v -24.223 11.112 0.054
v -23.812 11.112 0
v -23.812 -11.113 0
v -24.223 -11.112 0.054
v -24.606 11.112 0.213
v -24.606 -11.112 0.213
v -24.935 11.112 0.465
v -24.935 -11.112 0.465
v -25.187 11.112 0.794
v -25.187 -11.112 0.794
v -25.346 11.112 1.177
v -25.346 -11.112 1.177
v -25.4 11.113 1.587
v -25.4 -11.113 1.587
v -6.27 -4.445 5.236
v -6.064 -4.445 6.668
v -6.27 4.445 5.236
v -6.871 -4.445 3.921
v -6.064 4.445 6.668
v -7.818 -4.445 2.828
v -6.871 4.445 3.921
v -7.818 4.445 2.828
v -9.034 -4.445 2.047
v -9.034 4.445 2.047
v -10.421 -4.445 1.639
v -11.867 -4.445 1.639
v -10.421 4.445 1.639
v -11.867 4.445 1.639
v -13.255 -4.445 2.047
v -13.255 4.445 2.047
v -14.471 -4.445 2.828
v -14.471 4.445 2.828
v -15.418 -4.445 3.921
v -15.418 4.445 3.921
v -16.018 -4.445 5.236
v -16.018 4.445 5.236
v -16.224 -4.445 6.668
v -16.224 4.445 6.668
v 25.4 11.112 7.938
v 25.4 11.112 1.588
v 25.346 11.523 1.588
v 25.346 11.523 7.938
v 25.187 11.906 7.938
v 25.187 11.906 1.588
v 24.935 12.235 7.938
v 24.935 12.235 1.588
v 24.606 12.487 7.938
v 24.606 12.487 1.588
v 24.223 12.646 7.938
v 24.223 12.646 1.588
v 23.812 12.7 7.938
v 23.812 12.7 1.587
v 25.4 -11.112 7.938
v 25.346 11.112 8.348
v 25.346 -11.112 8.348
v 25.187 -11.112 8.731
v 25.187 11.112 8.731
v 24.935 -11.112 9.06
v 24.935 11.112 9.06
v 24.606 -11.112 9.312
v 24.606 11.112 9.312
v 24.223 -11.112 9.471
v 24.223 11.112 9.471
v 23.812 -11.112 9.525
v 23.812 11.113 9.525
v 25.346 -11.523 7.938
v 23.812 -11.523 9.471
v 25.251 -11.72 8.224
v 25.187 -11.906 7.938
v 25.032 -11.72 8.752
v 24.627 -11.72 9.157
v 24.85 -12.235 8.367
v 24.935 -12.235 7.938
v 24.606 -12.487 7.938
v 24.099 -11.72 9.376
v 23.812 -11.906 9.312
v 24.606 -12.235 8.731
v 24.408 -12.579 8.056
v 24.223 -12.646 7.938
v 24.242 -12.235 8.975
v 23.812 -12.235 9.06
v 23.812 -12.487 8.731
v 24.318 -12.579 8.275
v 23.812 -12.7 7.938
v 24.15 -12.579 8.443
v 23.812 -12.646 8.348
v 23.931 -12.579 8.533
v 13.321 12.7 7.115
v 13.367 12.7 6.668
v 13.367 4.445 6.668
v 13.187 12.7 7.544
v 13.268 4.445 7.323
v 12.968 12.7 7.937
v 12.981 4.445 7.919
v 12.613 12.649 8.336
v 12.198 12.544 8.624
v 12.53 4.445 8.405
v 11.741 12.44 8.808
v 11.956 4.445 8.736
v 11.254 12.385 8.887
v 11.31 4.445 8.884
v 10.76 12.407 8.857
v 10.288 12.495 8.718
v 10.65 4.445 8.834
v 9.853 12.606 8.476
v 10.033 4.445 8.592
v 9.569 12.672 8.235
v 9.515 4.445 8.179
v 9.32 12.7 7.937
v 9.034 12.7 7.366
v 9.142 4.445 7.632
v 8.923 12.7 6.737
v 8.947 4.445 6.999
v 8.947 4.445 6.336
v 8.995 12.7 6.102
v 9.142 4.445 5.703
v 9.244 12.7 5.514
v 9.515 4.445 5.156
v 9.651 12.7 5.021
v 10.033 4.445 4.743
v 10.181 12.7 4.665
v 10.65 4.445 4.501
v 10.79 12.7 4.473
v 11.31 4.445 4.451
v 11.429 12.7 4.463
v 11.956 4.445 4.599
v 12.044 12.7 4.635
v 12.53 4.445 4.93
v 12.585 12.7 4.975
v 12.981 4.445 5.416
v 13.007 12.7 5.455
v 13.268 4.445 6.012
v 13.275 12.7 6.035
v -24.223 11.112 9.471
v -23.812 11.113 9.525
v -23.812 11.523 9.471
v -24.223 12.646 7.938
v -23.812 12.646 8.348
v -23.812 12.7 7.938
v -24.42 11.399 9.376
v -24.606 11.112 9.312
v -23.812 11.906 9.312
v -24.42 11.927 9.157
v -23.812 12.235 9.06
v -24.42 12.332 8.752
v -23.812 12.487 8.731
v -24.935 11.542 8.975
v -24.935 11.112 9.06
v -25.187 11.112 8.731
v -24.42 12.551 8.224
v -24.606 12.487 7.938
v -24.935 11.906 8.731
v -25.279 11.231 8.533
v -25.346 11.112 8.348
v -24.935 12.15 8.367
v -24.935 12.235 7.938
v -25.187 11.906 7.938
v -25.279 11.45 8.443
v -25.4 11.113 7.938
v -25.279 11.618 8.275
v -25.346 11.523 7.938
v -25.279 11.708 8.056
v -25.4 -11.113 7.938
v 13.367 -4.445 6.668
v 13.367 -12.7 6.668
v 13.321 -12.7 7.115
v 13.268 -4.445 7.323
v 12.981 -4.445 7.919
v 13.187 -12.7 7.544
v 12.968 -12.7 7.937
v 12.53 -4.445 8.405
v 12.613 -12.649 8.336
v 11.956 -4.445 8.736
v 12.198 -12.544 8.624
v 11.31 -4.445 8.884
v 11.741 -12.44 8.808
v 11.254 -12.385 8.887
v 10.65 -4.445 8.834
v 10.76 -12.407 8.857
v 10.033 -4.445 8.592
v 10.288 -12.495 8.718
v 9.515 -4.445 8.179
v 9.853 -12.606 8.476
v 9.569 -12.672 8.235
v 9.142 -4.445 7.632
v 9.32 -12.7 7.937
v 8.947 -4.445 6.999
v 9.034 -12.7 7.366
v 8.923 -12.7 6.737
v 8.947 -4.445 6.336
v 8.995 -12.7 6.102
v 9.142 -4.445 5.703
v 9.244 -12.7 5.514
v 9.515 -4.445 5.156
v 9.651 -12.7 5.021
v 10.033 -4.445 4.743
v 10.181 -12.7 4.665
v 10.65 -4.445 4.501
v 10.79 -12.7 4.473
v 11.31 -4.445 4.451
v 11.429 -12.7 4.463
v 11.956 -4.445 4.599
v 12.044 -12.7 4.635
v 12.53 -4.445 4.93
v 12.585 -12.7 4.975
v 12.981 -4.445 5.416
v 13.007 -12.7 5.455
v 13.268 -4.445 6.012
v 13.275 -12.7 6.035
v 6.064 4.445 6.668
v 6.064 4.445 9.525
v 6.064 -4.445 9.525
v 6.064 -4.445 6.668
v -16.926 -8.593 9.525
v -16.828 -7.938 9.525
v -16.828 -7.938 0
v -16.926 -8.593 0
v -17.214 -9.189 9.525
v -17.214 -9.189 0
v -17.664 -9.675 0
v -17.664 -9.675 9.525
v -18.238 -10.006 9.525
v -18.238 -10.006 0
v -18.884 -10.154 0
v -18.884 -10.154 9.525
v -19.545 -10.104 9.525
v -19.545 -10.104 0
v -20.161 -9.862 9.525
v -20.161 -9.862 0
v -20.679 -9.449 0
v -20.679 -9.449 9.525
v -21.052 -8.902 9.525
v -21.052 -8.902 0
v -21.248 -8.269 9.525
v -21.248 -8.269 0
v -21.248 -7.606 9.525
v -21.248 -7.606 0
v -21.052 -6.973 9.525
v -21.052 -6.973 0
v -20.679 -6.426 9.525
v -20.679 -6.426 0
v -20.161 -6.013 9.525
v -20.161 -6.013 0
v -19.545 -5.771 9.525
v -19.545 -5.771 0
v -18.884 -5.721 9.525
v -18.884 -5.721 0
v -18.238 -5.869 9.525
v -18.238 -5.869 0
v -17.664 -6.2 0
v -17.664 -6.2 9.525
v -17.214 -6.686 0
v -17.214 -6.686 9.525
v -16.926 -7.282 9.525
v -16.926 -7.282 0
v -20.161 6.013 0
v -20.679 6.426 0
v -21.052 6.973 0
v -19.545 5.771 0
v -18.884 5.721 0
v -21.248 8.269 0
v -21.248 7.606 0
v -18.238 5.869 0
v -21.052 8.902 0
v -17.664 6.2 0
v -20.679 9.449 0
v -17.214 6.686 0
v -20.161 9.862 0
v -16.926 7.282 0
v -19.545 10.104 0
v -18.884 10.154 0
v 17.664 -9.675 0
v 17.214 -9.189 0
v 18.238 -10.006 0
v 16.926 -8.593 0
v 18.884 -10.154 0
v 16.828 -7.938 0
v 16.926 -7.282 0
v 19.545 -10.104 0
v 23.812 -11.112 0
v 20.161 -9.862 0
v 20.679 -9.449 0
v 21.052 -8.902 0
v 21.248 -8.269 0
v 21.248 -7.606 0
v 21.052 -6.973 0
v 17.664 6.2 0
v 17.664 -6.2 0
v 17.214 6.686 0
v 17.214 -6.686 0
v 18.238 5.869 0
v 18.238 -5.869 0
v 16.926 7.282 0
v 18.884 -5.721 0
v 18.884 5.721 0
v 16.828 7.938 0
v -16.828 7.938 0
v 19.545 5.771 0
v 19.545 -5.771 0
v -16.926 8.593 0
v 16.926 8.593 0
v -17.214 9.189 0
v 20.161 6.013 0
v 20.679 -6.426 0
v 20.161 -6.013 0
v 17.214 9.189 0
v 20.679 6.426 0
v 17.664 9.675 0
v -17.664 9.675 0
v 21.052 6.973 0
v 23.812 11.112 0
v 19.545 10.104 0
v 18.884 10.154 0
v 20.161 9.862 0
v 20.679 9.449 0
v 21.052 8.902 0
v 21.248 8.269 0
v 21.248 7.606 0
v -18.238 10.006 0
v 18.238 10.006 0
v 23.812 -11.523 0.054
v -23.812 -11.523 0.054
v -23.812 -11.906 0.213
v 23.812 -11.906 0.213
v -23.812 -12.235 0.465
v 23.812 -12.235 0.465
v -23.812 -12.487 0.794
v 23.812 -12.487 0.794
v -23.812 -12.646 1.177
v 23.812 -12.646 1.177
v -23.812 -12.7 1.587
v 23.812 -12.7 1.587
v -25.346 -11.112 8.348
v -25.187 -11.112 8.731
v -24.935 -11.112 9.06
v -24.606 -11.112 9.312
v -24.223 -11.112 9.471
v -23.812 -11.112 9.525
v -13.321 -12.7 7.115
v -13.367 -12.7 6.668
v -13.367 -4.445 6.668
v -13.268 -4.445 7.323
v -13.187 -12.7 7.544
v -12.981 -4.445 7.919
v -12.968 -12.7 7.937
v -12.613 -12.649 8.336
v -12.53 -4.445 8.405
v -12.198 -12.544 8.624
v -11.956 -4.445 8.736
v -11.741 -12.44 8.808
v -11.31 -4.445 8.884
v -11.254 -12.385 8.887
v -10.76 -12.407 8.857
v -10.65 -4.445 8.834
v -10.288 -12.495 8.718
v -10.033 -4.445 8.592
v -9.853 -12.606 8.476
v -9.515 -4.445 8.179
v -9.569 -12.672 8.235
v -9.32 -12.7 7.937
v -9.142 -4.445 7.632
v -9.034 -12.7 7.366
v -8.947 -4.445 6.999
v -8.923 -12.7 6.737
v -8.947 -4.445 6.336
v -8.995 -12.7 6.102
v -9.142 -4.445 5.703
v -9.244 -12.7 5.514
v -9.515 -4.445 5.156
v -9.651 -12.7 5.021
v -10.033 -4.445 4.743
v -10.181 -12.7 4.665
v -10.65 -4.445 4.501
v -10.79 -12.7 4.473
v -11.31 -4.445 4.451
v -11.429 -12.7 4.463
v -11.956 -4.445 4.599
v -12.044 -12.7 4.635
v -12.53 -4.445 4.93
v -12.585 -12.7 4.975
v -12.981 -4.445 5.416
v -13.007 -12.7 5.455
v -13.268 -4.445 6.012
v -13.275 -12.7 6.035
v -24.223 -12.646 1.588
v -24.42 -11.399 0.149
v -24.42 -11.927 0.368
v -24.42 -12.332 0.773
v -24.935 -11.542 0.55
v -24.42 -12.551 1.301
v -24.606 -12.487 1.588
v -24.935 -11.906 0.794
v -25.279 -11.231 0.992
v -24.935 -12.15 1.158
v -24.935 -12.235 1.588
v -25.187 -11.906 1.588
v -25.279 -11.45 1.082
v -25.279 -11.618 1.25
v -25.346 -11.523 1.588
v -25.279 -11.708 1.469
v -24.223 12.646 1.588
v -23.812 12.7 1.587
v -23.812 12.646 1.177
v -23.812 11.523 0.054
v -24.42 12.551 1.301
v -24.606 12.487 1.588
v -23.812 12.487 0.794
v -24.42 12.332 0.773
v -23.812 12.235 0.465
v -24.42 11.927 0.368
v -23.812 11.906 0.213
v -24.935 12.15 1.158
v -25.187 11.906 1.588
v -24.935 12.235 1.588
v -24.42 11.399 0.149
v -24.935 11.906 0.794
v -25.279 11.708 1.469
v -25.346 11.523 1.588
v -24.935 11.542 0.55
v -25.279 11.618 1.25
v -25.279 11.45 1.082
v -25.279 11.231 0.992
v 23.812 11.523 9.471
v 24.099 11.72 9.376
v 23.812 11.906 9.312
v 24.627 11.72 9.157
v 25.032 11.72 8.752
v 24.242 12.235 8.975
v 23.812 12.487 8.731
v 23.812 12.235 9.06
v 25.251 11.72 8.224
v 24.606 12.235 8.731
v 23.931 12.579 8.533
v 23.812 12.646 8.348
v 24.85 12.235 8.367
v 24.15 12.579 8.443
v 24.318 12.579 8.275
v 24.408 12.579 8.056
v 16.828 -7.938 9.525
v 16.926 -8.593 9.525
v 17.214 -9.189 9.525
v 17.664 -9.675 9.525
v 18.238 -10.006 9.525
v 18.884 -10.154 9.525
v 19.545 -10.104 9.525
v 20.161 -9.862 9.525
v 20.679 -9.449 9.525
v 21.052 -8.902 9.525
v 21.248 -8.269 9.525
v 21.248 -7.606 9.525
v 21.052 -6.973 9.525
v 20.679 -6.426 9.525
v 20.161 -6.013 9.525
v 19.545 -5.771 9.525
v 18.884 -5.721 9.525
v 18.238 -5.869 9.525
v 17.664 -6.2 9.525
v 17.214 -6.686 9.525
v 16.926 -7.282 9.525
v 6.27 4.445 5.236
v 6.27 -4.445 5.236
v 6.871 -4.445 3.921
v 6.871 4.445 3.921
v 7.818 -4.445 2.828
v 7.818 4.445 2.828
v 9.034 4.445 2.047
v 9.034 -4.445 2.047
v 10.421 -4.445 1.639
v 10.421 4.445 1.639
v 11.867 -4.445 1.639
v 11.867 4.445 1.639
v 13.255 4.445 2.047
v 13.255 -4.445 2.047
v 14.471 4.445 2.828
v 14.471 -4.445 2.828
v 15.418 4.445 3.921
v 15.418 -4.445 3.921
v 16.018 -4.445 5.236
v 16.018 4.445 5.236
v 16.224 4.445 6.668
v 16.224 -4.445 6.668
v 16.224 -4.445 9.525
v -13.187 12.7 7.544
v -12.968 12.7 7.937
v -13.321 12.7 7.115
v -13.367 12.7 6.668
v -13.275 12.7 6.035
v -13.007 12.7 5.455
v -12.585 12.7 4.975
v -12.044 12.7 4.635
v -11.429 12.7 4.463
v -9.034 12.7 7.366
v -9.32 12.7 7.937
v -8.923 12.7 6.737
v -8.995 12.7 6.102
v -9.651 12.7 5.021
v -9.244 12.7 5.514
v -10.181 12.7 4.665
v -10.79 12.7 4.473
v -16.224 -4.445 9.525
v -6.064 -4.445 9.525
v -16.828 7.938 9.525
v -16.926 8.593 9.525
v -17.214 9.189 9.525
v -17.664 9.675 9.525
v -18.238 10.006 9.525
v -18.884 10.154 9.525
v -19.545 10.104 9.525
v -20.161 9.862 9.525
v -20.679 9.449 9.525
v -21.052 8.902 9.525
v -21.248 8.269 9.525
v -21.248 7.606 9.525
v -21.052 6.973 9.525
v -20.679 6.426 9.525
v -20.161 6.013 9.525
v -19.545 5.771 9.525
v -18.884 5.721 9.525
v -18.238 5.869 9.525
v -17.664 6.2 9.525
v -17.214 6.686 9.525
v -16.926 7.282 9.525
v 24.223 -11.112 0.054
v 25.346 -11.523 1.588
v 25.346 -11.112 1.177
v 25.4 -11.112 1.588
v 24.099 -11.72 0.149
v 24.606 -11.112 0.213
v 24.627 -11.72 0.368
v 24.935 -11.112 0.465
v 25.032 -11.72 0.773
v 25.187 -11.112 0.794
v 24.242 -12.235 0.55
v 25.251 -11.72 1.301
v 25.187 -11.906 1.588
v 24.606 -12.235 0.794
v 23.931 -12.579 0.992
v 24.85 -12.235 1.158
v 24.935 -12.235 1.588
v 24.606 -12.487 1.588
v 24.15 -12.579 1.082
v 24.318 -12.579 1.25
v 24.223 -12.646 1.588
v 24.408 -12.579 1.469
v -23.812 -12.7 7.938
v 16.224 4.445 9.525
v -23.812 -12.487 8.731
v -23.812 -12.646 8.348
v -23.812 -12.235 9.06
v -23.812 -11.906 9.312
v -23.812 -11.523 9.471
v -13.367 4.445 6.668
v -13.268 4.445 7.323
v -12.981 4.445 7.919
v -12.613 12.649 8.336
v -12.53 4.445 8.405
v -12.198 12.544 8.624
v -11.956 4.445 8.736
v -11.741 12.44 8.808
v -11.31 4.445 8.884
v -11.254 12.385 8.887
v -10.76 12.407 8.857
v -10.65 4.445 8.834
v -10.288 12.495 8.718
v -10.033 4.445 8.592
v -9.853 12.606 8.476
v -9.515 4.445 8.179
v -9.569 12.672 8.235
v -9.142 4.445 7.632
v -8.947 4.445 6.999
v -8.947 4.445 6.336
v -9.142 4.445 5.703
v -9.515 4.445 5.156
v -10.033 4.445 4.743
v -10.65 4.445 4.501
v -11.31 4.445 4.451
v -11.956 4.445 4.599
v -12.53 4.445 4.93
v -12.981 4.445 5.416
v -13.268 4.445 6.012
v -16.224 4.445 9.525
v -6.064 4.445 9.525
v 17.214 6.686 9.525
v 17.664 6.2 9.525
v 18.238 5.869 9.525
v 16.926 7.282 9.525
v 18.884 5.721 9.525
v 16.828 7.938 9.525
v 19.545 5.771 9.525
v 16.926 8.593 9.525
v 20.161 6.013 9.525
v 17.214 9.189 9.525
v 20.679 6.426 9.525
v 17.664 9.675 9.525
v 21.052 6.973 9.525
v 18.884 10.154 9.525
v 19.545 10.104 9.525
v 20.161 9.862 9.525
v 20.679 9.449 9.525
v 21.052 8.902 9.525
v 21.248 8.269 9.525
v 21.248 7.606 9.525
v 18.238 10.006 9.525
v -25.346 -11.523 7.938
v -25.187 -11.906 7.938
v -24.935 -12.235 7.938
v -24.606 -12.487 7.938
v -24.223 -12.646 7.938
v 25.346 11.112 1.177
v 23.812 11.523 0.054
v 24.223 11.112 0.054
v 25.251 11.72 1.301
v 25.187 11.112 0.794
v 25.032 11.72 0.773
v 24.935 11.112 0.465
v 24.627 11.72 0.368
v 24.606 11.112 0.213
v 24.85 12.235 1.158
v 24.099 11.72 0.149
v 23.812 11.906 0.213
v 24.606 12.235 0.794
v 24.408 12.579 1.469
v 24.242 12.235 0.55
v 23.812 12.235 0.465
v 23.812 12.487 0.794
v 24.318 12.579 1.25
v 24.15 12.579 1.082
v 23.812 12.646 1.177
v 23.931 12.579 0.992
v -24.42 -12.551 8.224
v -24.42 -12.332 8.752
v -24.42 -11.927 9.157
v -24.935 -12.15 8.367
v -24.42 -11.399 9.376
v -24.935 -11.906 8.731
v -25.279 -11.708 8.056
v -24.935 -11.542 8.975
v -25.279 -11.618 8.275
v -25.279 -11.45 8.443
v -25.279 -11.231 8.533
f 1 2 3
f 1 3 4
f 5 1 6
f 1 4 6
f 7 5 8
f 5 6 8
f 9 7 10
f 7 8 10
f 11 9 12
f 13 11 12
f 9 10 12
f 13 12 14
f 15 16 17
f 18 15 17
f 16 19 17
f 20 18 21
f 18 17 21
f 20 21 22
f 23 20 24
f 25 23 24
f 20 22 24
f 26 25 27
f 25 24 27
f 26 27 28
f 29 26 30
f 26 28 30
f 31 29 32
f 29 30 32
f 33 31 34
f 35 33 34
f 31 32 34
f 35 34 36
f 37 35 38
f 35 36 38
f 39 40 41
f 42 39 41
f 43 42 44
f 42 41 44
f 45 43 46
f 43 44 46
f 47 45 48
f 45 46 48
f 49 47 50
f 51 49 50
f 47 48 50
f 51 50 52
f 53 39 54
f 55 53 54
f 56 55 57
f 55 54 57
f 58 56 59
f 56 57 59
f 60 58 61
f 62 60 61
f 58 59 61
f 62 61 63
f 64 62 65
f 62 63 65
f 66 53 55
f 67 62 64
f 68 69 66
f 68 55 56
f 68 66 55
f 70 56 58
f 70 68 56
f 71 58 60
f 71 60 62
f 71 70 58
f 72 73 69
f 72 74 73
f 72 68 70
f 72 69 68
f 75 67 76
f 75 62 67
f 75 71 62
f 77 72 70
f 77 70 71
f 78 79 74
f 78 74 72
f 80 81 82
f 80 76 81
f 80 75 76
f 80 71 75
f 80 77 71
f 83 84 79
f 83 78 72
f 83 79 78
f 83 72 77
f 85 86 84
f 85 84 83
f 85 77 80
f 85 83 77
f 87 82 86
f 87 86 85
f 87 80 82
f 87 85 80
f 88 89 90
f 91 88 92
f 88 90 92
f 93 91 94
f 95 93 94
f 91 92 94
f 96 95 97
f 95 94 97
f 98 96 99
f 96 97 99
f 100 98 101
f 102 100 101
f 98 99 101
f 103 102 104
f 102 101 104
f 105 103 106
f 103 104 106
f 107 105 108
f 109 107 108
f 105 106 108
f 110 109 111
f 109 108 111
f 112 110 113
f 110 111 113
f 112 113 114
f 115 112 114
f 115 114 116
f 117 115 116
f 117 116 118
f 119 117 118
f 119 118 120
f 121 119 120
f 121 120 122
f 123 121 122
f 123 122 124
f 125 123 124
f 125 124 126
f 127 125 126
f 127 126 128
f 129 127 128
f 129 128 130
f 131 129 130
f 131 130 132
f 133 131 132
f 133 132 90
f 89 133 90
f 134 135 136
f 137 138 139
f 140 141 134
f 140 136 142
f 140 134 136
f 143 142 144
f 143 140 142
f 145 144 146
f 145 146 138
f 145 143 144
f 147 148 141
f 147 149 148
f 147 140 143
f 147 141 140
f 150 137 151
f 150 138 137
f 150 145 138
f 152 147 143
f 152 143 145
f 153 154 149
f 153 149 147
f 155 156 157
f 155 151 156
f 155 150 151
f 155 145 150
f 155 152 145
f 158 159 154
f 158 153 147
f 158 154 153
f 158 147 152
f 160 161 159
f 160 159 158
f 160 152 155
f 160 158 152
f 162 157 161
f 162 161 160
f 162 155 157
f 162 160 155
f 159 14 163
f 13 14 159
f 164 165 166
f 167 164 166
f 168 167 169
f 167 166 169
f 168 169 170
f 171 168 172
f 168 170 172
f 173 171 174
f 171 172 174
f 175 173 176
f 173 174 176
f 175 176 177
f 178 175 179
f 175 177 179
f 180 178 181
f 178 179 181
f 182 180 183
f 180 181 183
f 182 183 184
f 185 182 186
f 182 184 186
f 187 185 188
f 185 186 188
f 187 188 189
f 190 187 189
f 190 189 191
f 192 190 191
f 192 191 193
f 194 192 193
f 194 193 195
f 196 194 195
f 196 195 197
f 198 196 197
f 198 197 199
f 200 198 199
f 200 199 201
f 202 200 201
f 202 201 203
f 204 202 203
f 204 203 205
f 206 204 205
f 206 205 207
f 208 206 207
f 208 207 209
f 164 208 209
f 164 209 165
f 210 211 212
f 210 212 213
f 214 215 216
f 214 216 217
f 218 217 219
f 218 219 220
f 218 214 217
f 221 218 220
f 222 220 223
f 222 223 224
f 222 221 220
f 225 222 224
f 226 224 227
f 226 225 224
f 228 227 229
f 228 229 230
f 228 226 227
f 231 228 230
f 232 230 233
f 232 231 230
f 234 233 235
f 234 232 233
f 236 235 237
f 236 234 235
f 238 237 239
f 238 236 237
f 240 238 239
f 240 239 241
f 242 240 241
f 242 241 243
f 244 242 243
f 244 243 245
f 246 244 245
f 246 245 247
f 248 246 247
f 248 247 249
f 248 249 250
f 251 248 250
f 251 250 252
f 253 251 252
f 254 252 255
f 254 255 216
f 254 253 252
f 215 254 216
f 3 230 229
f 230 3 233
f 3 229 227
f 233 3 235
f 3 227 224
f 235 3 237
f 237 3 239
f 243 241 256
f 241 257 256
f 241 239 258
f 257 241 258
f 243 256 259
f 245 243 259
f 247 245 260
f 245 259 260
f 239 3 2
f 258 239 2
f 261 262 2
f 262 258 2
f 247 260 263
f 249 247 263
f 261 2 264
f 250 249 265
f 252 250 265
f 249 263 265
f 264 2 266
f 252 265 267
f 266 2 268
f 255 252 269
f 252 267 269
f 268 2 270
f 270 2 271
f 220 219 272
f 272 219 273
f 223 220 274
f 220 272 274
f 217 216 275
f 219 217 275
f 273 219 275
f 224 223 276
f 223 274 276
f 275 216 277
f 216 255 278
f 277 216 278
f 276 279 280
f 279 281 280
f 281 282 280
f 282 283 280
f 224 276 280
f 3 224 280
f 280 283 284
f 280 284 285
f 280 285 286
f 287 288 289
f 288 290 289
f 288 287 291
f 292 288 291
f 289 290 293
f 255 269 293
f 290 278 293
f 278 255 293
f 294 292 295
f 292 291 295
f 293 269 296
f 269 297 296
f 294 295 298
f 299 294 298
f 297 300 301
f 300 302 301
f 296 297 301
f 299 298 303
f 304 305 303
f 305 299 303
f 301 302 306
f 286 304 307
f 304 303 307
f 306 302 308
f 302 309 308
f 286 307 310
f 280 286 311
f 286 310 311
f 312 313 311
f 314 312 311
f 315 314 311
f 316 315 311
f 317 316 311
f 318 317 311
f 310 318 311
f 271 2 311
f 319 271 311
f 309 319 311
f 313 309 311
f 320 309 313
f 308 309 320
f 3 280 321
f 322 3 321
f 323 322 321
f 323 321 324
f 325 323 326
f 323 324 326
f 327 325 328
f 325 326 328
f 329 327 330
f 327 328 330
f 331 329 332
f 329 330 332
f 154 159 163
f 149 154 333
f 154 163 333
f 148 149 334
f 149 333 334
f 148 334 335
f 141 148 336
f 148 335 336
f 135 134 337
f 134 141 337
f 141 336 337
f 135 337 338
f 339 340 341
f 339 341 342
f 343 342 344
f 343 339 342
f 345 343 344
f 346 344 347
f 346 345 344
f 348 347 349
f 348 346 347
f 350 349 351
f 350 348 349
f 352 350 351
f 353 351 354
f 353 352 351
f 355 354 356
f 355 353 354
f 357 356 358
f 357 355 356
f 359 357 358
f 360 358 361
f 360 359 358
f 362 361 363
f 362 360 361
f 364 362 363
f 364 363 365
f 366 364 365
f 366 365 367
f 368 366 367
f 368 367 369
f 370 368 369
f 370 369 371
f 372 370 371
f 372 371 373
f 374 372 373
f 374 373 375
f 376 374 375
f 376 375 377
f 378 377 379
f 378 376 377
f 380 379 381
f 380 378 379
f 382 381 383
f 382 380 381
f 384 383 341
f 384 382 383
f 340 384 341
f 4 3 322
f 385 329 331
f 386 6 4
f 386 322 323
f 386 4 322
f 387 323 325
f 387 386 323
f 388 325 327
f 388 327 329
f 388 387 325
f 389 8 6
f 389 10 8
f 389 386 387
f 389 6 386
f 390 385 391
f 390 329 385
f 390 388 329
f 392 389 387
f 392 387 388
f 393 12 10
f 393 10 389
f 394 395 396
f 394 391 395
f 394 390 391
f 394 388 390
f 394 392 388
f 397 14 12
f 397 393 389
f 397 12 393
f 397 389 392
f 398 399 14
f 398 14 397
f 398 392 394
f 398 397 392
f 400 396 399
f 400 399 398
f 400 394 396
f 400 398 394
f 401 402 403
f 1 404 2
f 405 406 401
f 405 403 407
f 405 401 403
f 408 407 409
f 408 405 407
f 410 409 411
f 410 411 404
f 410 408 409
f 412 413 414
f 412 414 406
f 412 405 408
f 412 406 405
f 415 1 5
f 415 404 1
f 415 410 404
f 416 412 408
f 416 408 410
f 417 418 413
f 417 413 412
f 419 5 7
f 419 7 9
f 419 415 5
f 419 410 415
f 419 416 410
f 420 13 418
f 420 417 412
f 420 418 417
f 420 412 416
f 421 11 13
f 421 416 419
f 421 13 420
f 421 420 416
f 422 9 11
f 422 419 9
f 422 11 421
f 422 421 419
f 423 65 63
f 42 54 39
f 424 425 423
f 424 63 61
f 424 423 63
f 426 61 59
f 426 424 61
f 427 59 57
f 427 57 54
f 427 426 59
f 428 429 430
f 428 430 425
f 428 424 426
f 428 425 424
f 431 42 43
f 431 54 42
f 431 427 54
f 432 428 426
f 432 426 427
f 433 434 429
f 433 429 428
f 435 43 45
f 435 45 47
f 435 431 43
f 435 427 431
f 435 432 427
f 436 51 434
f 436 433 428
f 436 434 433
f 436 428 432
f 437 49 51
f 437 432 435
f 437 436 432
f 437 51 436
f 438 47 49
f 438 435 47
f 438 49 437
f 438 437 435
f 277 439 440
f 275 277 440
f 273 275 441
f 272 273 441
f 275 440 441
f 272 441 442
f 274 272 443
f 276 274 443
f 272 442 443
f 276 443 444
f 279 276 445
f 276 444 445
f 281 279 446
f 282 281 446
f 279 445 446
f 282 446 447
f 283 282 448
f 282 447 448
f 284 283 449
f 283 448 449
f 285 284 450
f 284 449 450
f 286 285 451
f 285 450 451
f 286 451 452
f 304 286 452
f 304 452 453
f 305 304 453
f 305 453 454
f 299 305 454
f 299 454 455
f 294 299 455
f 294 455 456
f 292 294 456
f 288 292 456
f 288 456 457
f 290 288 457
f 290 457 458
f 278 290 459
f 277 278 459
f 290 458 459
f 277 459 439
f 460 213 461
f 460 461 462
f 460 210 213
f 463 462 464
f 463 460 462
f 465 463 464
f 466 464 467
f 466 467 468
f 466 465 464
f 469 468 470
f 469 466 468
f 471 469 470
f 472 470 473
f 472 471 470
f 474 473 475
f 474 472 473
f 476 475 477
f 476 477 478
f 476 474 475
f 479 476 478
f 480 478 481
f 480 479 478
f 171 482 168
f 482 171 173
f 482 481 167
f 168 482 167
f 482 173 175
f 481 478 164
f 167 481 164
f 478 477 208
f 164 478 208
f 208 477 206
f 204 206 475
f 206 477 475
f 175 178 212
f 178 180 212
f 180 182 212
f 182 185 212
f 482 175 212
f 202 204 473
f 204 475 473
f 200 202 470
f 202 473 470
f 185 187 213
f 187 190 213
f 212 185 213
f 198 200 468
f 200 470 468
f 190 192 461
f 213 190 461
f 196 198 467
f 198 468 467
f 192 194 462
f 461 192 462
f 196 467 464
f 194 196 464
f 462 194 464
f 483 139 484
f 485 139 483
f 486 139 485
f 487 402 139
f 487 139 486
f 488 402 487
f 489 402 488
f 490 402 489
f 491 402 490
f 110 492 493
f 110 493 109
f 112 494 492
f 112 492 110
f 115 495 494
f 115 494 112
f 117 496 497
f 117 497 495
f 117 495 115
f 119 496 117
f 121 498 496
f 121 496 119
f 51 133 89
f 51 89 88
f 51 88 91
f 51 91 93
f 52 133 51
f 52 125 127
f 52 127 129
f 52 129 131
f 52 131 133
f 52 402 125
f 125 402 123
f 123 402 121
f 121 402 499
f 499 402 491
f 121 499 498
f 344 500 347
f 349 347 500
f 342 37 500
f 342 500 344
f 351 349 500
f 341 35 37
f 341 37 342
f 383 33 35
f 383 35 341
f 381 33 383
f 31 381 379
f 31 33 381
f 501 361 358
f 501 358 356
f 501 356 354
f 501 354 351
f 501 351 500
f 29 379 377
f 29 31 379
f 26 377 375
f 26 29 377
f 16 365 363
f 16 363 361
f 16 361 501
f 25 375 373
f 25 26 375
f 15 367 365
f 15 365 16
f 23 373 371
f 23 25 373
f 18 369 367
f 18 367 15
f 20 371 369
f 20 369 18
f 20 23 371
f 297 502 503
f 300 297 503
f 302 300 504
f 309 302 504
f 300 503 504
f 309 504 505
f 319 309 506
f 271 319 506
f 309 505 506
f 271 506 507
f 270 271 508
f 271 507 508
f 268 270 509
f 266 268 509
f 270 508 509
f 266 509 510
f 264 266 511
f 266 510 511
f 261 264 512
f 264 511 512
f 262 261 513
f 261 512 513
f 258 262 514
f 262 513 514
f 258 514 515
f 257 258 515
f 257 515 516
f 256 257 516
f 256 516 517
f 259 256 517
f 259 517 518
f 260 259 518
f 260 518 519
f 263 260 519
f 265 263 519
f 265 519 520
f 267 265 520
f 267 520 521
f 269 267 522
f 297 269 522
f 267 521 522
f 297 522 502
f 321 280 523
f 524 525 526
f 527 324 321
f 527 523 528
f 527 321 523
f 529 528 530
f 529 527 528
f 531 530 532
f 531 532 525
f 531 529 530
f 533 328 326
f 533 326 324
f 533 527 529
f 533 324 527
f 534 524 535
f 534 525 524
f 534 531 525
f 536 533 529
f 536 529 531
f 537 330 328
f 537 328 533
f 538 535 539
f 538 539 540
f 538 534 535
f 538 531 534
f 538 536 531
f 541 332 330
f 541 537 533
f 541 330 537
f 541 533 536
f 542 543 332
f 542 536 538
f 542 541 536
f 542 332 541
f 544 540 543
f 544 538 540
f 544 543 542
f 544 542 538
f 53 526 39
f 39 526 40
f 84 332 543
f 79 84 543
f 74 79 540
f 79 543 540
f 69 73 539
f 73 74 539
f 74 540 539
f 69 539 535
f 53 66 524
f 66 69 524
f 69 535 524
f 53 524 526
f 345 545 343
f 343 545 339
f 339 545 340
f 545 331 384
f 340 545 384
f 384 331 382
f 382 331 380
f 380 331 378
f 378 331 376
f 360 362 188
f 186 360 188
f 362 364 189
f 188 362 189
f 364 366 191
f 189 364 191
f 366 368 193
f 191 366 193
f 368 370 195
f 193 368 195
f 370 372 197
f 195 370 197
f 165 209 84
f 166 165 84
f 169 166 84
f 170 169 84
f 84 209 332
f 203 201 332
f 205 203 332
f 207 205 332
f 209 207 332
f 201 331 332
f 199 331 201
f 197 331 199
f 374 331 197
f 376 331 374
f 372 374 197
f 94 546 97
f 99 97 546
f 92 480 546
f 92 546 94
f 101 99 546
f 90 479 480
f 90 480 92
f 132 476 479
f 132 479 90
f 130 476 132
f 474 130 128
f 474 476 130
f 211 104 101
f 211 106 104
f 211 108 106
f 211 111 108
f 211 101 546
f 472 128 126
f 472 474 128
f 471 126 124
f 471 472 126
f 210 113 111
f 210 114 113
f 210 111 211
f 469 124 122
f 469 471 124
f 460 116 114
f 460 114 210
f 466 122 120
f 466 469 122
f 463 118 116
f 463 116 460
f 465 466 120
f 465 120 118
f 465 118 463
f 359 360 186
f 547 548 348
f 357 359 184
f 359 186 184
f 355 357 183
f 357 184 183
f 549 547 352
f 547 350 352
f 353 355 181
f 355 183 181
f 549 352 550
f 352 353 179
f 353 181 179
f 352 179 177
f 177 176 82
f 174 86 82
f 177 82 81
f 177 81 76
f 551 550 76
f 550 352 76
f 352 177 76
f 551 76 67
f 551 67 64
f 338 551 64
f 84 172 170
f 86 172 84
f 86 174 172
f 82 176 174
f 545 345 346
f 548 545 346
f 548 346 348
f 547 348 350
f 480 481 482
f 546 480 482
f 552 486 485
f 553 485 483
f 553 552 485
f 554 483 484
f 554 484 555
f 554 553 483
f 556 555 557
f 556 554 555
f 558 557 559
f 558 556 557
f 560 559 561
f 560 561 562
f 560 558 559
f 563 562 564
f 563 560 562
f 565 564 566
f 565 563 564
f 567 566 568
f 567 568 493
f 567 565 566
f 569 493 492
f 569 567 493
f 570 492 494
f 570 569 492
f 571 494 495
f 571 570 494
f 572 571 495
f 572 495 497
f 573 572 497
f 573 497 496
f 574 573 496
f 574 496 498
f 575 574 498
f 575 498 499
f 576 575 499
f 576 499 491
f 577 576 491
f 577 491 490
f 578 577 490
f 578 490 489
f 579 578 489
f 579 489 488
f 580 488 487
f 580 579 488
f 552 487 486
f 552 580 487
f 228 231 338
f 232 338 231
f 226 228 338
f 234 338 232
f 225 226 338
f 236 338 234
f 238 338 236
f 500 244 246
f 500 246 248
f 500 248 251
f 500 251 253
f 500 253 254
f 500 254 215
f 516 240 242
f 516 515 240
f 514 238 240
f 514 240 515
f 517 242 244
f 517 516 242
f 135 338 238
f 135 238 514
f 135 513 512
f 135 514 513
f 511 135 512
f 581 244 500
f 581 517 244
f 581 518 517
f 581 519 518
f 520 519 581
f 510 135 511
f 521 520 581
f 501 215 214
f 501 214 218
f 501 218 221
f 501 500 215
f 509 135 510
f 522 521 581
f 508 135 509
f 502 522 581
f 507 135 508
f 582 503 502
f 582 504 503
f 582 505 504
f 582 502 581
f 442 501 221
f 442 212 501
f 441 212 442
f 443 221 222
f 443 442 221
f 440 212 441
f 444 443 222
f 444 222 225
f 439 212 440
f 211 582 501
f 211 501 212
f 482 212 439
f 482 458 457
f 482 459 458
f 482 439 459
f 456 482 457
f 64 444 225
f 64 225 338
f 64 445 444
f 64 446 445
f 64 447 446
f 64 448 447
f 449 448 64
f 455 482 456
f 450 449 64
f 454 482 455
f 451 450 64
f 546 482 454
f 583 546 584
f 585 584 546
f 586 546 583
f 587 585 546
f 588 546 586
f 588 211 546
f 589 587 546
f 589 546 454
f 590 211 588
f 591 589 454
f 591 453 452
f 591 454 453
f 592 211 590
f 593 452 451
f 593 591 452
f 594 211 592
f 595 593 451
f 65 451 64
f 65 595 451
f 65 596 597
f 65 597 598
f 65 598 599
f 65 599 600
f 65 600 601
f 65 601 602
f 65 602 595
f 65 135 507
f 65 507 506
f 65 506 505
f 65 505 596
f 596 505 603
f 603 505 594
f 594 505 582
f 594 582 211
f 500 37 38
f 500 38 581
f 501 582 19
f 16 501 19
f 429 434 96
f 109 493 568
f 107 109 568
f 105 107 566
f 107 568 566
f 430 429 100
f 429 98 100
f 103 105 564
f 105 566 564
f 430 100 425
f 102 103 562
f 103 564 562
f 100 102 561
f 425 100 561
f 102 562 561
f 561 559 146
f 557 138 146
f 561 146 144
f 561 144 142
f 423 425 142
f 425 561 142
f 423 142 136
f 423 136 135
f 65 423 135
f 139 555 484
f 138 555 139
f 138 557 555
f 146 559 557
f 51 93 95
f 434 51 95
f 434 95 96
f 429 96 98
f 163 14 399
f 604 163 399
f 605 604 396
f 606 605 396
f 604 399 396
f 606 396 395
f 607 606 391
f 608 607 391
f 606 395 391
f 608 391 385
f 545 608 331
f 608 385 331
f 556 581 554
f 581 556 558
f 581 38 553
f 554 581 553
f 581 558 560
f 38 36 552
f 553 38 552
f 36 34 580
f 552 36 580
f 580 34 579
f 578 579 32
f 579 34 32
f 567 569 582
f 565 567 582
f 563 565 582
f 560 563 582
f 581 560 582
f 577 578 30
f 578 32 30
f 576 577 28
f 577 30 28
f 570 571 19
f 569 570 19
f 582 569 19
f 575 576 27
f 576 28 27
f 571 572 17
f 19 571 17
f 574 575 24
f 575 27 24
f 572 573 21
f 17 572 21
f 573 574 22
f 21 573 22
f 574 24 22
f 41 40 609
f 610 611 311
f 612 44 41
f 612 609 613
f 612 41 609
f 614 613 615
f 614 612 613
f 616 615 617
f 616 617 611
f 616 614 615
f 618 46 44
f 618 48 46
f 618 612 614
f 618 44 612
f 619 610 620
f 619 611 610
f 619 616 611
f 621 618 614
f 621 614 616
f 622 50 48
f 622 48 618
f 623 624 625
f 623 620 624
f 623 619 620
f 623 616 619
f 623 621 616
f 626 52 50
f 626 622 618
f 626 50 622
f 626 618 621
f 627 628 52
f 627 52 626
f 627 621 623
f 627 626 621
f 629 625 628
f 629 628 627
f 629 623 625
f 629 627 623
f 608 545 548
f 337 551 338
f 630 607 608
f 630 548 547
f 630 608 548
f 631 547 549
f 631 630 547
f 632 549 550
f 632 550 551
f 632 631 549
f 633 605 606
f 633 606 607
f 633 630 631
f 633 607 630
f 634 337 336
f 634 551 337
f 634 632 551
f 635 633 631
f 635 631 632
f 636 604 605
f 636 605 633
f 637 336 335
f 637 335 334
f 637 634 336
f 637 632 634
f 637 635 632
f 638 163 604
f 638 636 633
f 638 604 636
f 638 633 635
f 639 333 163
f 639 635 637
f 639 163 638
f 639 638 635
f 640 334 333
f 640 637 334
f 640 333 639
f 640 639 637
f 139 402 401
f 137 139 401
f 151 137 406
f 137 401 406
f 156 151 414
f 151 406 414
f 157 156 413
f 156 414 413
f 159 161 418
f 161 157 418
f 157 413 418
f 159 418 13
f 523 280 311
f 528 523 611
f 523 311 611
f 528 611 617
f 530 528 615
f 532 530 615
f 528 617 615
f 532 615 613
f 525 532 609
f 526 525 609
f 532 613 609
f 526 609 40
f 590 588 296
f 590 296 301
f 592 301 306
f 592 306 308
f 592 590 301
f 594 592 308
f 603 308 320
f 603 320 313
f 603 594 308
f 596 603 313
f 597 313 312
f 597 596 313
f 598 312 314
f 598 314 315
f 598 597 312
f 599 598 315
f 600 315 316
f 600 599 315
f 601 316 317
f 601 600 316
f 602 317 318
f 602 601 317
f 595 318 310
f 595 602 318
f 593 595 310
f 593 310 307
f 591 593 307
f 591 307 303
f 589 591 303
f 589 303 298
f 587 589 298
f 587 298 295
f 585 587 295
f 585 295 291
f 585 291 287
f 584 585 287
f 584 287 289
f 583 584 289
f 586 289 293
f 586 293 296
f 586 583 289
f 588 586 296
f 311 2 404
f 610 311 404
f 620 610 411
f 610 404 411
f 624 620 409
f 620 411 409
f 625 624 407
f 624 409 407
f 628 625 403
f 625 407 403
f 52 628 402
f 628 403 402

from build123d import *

# Parameters (mm, degrees)
SKETCH1_W               = 50.8
SKETCH1_H               = 25.4
BOSS_EXTRUDE1_DEPTH     = 9.525
CUT_EXTRUDE2_DEPTH      = 4.445
SKETCH2_R               = 2.2225
CUT_EXTRUDE1_DEPTH      = 9.525
CUT_EXTRUDE3_START      = -38.162422217
SKETCH5_R               = 2.2225
CUT_EXTRUDE3_DEPTH      = 41.337422217
MIRROR2_COPY_1_SKETCH_R = 2.2225
MIRROR2_COPY_1_DEPTH    = 9.525
FILLET1_R               = 1.5875


with BuildPart() as part:
    # Sketch1 → Boss-Extrude1 (new body)
    with BuildSketch(Plane.XY):
        Rectangle(SKETCH1_W, SKETCH1_H)
    extrude(amount=BOSS_EXTRUDE1_DEPTH)

    # Sketch4 → Cut-Extrude2 (cut, symmetric)
    with BuildSketch(Plane(origin=(0, 0, 0), x_dir=(1, 0, 0), z_dir=(0, 1, 0))):
        with BuildLine():
            Line((-16.22425, -6.6675), (-16.22425, -9.525))
            Line((-16.22425, -9.525), (-6.06425, -9.525))
            Line((-6.06425, -9.525), (-6.06425, -6.6675))
            ThreePointArc((-6.06425, -6.6675), (-11.14425, -1.5875), (-16.22425, -6.6675))
        make_face()
    cut_extrude2 = extrude(amount=CUT_EXTRUDE2_DEPTH, both=True, mode=Mode.SUBTRACT)

    # Sketch2 → Cut-Extrude1 (cut)
    with BuildSketch(Plane.XY.offset(9.525)):
        with Locations((-19.05, 7.9375)):
            Circle(SKETCH2_R)
    cut_extrude1 = extrude(amount=-CUT_EXTRUDE1_DEPTH, mode=Mode.SUBTRACT)

    # Sketch5 → Cut-Extrude3 (cut)
    with BuildSketch(Plane(origin=(0, 12.7, 0), x_dir=(1, 0, 0), z_dir=(0, 1, 0)).offset(CUT_EXTRUDE3_START)):
        with Locations(Location((-11.14425, -6.6675, 0), (0, 0, 180))):
            Circle(SKETCH5_R)
    cut_extrude3 = extrude(amount=CUT_EXTRUDE3_DEPTH, mode=Mode.SUBTRACT)

    # Mirror1: Cut-Extrude1 across plane
    add(cut_extrude1.mirror(Plane.ZX), mode=Mode.SUBTRACT)

    # Mirror2: Cut-Extrude2, Cut-Extrude1, Cut-Extrude3 across plane
    add(cut_extrude2.mirror(Plane.ZY), mode=Mode.SUBTRACT)
    add(cut_extrude1.mirror(Plane.ZY), mode=Mode.SUBTRACT)
    add(cut_extrude3.mirror(Plane.ZY), mode=Mode.SUBTRACT)

    # Mirror2 copy 1 sketch → Mirror2 copy 1 (cut)
    with BuildSketch(Plane(origin=(0, 0, 9.525), x_dir=(-1, 0, 0), z_dir=(0, 0, 1))):
        with Locations((-19.05, 7.9375)):
            Circle(MIRROR2_COPY_1_SKETCH_R)
    extrude(amount=-MIRROR2_COPY_1_DEPTH, mode=Mode.SUBTRACT)

    # Fillet1
    # the kernel refuses this fillet: 1.5875 mm, written as the material it takes off along each edge
    with BuildSketch(Plane(origin=(-23.8125, 11.1125, 7.9375), x_dir=(0, 1, 0), z_dir=(-1, 0, 0))) as fillet1_piece_1_section:
        Polygon((0, 0), (FILLET1_R, 0), (FILLET1_R, -FILLET1_R), (0, -FILLET1_R), align=None)
    fillet1_piece_1 = extrude(amount=FILLET1_R, mode=Mode.PRIVATE)
    fillet1_piece_1 = fillet1_piece_1 - Plane(origin=(-23.8125, 11.1125, 7.9375), x_dir=(0, -0.7071067811865475, -0.7071067811865475), z_dir=(-1, 0, 0)) * Sphere(FILLET1_R, mode=Mode.PRIVATE)
    add(fillet1_piece_1, mode=Mode.SUBTRACT)
    with BuildSketch(Plane(origin=(23.8125, 11.1125, 7.9375), x_dir=(0, 0, 1), z_dir=(0, 1, 0))) as fillet1_piece_2_section:
        Polygon((0, 0), (FILLET1_R, 0), (FILLET1_R, FILLET1_R), (0, FILLET1_R), align=None)
    fillet1_piece_2 = extrude(amount=FILLET1_R, mode=Mode.PRIVATE)
    fillet1_piece_2 = fillet1_piece_2 - Plane(origin=(23.8125, 11.1125, 7.9375), x_dir=(-0.7071067811865475, 0, -0.7071067811865475), z_dir=(0, 1, 0)) * Sphere(FILLET1_R, mode=Mode.PRIVATE)
    add(fillet1_piece_2, mode=Mode.SUBTRACT)
    with BuildSketch(Plane(origin=(-23.8125, -11.1125, 7.9375), x_dir=(0, -1, 0), z_dir=(-1, 0, 0))) as fillet1_piece_3_section:
        Polygon((0, 0), (FILLET1_R, 0), (FILLET1_R, FILLET1_R), (0, FILLET1_R), align=None)
    fillet1_piece_3 = extrude(amount=FILLET1_R, mode=Mode.PRIVATE)
    fillet1_piece_3 = fillet1_piece_3 - Plane(origin=(-23.8125, -11.1125, 7.9375), x_dir=(0, 0.7071067811865475, -0.7071067811865475), z_dir=(-1, 0, 0)) * Sphere(FILLET1_R, mode=Mode.PRIVATE)
    add(fillet1_piece_3, mode=Mode.SUBTRACT)
    with BuildSketch(Plane(origin=(23.8125, -11.1125, 7.9375), x_dir=(0, 0, 1), z_dir=(0, -1, 0))) as fillet1_piece_4_section:
        Polygon((0, 0), (FILLET1_R, 0), (FILLET1_R, -FILLET1_R), (0, -FILLET1_R), align=None)
    fillet1_piece_4 = extrude(amount=FILLET1_R, mode=Mode.PRIVATE)
    fillet1_piece_4 = fillet1_piece_4 - Plane(origin=(23.8125, -11.1125, 7.9375), x_dir=(-0.7071067811865475, 0, -0.7071067811865475), z_dir=(0, -1, 0)) * Sphere(FILLET1_R, mode=Mode.PRIVATE)
    add(fillet1_piece_4, mode=Mode.SUBTRACT)
    with BuildSketch(Plane(origin=(-23.8125, -11.1125, 1.5875), x_dir=(0, -1, 0), z_dir=(-1, 0, 0))) as fillet1_piece_5_section:
        Polygon((0, 0), (FILLET1_R, 0), (FILLET1_R, -FILLET1_R), (0, -FILLET1_R), align=None)
    fillet1_piece_5 = extrude(amount=FILLET1_R, mode=Mode.PRIVATE)
    fillet1_piece_5 = fillet1_piece_5 - Plane(origin=(-23.8125, -11.1125, 1.5875), x_dir=(0, 0.7071067811865475, 0.7071067811865475), z_dir=(-1, 0, 0)) * Sphere(FILLET1_R, mode=Mode.PRIVATE)
    add(fillet1_piece_5, mode=Mode.SUBTRACT)
    with BuildSketch(Plane(origin=(-23.8125, 11.1125, 1.5875), x_dir=(0, 1, 0), z_dir=(-1, 0, 0))) as fillet1_piece_6_section:
        Polygon((0, 0), (FILLET1_R, 0), (FILLET1_R, FILLET1_R), (0, FILLET1_R), align=None)
    fillet1_piece_6 = extrude(amount=FILLET1_R, mode=Mode.PRIVATE)
    fillet1_piece_6 = fillet1_piece_6 - Plane(origin=(-23.8125, 11.1125, 1.5875), x_dir=(0, -0.7071067811865475, 0.7071067811865475), z_dir=(-1, 0, 0)) * Sphere(FILLET1_R, mode=Mode.PRIVATE)
    add(fillet1_piece_6, mode=Mode.SUBTRACT)
    with BuildSketch(Plane(origin=(23.8125, 11.1125, 1.5875), x_dir=(0, 0, -1), z_dir=(0, 1, 0))) as fillet1_piece_7_section:
        Polygon((0, 0), (FILLET1_R, 0), (FILLET1_R, -FILLET1_R), (0, -FILLET1_R), align=None)
    fillet1_piece_7 = extrude(amount=FILLET1_R, mode=Mode.PRIVATE)
    fillet1_piece_7 = fillet1_piece_7 - Plane(origin=(23.8125, 11.1125, 1.5875), x_dir=(-0.7071067811865475, 0, 0.7071067811865475), z_dir=(0, 1, 0)) * Sphere(FILLET1_R, mode=Mode.PRIVATE)
    add(fillet1_piece_7, mode=Mode.SUBTRACT)
    with BuildSketch(Plane(origin=(23.8125, -11.1125, 1.5875), x_dir=(0, 0, -1), z_dir=(0, -1, 0))) as fillet1_piece_8_section:
        Polygon((0, 0), (FILLET1_R, 0), (FILLET1_R, FILLET1_R), (0, FILLET1_R), align=None)
    fillet1_piece_8 = extrude(amount=FILLET1_R, mode=Mode.PRIVATE)
    fillet1_piece_8 = fillet1_piece_8 - Plane(origin=(23.8125, -11.1125, 1.5875), x_dir=(-0.7071067811865475, 0, 0.7071067811865475), z_dir=(0, -1, 0)) * Sphere(FILLET1_R, mode=Mode.PRIVATE)
    add(fillet1_piece_8, mode=Mode.SUBTRACT)
    with BuildSketch(Plane(origin=(-23.8125, 12.7, 9.525), x_dir=(0, 0, -1), z_dir=(1, 0, 0)), Plane(origin=(23.8125, -12.7, 9.525), x_dir=(0, 0, -1), z_dir=(-1, 0, 0))) as fillet1_piece_9:
        with BuildLine():
            CenterArc((FILLET1_R, -FILLET1_R), FILLET1_R, 90, 90)
            Line((0, -FILLET1_R), (0, 0))
            Line((0, 0), (FILLET1_R, 0))
        make_face()
    extrude(amount=47.625, mode=Mode.SUBTRACT)
    with BuildSketch(Plane(origin=(-25.4, -11.1125, 9.525), x_dir=(0, 0, -1), z_dir=(0, 1, 0)), Plane(origin=(25.4, 11.1125, 0), x_dir=(-1, 0, 0), z_dir=(0, -1, 0))) as fillet1_piece_10:
        with BuildLine():
            CenterArc((FILLET1_R, -FILLET1_R), FILLET1_R, 90, 90)
            Line((0, -FILLET1_R), (0, 0))
            Line((0, 0), (FILLET1_R, 0))
        make_face()
    extrude(amount=22.225, mode=Mode.SUBTRACT)
    with BuildSketch(Plane(origin=(-25.4, -11.1125, 0), x_dir=(0, 0, 1), z_dir=(0, 1, 0)), Plane(origin=(25.4, 11.1125, 9.525), x_dir=(-1, 0, 0), z_dir=(0, -1, 0))) as fillet1_piece_11:
        with BuildLine():
            CenterArc((FILLET1_R, FILLET1_R), FILLET1_R, 180, 90)
            Line((0, FILLET1_R), (0, 0))
            Line((0, 0), (FILLET1_R, 0))
        make_face()
    extrude(amount=22.225, mode=Mode.SUBTRACT)
    with BuildSketch(Plane(origin=(-23.8125, 12.7, 0), x_dir=(0, 0, 1), z_dir=(1, 0, 0)), Plane(origin=(23.8125, -12.7, 0), x_dir=(0, 0, 1), z_dir=(-1, 0, 0))) as fillet1_piece_12:
        with BuildLine():
            CenterArc((FILLET1_R, FILLET1_R), FILLET1_R, 180, 90)
            Line((0, FILLET1_R), (0, 0))
            Line((0, 0), (FILLET1_R, 0))
        make_face()
    extrude(amount=47.625, mode=Mode.SUBTRACT)
    with BuildSketch(Plane(origin=(-25.4, -12.7, 1.5875), x_dir=(0, 1, 0), z_dir=(0, 0, 1)), Plane(origin=(25.4, -12.7, 1.5875), x_dir=(-1, 0, 0), z_dir=(0, 0, 1))) as fillet1_piece_13:
        with BuildLine():
            CenterArc((FILLET1_R, -FILLET1_R), FILLET1_R, 90, 90)
            Line((0, -FILLET1_R), (0, 0))
            Line((0, 0), (FILLET1_R, 0))
        make_face()
    extrude(amount=6.35, mode=Mode.SUBTRACT)
    with BuildSketch(Plane(origin=(-25.4, 12.7, 1.5875), x_dir=(0, -1, 0), z_dir=(0, 0, 1)), Plane(origin=(25.4, 12.7, 1.5875), x_dir=(-1, 0, 0), z_dir=(0, 0, 1))) as fillet1_piece_14:
        with BuildLine():
            CenterArc((FILLET1_R, FILLET1_R), FILLET1_R, 180, 90)
            Line((0, FILLET1_R), (0, 0))
            Line((0, 0), (FILLET1_R, 0))
        make_face()
    extrude(amount=6.35, mode=Mode.SUBTRACT)


solid = part.part
